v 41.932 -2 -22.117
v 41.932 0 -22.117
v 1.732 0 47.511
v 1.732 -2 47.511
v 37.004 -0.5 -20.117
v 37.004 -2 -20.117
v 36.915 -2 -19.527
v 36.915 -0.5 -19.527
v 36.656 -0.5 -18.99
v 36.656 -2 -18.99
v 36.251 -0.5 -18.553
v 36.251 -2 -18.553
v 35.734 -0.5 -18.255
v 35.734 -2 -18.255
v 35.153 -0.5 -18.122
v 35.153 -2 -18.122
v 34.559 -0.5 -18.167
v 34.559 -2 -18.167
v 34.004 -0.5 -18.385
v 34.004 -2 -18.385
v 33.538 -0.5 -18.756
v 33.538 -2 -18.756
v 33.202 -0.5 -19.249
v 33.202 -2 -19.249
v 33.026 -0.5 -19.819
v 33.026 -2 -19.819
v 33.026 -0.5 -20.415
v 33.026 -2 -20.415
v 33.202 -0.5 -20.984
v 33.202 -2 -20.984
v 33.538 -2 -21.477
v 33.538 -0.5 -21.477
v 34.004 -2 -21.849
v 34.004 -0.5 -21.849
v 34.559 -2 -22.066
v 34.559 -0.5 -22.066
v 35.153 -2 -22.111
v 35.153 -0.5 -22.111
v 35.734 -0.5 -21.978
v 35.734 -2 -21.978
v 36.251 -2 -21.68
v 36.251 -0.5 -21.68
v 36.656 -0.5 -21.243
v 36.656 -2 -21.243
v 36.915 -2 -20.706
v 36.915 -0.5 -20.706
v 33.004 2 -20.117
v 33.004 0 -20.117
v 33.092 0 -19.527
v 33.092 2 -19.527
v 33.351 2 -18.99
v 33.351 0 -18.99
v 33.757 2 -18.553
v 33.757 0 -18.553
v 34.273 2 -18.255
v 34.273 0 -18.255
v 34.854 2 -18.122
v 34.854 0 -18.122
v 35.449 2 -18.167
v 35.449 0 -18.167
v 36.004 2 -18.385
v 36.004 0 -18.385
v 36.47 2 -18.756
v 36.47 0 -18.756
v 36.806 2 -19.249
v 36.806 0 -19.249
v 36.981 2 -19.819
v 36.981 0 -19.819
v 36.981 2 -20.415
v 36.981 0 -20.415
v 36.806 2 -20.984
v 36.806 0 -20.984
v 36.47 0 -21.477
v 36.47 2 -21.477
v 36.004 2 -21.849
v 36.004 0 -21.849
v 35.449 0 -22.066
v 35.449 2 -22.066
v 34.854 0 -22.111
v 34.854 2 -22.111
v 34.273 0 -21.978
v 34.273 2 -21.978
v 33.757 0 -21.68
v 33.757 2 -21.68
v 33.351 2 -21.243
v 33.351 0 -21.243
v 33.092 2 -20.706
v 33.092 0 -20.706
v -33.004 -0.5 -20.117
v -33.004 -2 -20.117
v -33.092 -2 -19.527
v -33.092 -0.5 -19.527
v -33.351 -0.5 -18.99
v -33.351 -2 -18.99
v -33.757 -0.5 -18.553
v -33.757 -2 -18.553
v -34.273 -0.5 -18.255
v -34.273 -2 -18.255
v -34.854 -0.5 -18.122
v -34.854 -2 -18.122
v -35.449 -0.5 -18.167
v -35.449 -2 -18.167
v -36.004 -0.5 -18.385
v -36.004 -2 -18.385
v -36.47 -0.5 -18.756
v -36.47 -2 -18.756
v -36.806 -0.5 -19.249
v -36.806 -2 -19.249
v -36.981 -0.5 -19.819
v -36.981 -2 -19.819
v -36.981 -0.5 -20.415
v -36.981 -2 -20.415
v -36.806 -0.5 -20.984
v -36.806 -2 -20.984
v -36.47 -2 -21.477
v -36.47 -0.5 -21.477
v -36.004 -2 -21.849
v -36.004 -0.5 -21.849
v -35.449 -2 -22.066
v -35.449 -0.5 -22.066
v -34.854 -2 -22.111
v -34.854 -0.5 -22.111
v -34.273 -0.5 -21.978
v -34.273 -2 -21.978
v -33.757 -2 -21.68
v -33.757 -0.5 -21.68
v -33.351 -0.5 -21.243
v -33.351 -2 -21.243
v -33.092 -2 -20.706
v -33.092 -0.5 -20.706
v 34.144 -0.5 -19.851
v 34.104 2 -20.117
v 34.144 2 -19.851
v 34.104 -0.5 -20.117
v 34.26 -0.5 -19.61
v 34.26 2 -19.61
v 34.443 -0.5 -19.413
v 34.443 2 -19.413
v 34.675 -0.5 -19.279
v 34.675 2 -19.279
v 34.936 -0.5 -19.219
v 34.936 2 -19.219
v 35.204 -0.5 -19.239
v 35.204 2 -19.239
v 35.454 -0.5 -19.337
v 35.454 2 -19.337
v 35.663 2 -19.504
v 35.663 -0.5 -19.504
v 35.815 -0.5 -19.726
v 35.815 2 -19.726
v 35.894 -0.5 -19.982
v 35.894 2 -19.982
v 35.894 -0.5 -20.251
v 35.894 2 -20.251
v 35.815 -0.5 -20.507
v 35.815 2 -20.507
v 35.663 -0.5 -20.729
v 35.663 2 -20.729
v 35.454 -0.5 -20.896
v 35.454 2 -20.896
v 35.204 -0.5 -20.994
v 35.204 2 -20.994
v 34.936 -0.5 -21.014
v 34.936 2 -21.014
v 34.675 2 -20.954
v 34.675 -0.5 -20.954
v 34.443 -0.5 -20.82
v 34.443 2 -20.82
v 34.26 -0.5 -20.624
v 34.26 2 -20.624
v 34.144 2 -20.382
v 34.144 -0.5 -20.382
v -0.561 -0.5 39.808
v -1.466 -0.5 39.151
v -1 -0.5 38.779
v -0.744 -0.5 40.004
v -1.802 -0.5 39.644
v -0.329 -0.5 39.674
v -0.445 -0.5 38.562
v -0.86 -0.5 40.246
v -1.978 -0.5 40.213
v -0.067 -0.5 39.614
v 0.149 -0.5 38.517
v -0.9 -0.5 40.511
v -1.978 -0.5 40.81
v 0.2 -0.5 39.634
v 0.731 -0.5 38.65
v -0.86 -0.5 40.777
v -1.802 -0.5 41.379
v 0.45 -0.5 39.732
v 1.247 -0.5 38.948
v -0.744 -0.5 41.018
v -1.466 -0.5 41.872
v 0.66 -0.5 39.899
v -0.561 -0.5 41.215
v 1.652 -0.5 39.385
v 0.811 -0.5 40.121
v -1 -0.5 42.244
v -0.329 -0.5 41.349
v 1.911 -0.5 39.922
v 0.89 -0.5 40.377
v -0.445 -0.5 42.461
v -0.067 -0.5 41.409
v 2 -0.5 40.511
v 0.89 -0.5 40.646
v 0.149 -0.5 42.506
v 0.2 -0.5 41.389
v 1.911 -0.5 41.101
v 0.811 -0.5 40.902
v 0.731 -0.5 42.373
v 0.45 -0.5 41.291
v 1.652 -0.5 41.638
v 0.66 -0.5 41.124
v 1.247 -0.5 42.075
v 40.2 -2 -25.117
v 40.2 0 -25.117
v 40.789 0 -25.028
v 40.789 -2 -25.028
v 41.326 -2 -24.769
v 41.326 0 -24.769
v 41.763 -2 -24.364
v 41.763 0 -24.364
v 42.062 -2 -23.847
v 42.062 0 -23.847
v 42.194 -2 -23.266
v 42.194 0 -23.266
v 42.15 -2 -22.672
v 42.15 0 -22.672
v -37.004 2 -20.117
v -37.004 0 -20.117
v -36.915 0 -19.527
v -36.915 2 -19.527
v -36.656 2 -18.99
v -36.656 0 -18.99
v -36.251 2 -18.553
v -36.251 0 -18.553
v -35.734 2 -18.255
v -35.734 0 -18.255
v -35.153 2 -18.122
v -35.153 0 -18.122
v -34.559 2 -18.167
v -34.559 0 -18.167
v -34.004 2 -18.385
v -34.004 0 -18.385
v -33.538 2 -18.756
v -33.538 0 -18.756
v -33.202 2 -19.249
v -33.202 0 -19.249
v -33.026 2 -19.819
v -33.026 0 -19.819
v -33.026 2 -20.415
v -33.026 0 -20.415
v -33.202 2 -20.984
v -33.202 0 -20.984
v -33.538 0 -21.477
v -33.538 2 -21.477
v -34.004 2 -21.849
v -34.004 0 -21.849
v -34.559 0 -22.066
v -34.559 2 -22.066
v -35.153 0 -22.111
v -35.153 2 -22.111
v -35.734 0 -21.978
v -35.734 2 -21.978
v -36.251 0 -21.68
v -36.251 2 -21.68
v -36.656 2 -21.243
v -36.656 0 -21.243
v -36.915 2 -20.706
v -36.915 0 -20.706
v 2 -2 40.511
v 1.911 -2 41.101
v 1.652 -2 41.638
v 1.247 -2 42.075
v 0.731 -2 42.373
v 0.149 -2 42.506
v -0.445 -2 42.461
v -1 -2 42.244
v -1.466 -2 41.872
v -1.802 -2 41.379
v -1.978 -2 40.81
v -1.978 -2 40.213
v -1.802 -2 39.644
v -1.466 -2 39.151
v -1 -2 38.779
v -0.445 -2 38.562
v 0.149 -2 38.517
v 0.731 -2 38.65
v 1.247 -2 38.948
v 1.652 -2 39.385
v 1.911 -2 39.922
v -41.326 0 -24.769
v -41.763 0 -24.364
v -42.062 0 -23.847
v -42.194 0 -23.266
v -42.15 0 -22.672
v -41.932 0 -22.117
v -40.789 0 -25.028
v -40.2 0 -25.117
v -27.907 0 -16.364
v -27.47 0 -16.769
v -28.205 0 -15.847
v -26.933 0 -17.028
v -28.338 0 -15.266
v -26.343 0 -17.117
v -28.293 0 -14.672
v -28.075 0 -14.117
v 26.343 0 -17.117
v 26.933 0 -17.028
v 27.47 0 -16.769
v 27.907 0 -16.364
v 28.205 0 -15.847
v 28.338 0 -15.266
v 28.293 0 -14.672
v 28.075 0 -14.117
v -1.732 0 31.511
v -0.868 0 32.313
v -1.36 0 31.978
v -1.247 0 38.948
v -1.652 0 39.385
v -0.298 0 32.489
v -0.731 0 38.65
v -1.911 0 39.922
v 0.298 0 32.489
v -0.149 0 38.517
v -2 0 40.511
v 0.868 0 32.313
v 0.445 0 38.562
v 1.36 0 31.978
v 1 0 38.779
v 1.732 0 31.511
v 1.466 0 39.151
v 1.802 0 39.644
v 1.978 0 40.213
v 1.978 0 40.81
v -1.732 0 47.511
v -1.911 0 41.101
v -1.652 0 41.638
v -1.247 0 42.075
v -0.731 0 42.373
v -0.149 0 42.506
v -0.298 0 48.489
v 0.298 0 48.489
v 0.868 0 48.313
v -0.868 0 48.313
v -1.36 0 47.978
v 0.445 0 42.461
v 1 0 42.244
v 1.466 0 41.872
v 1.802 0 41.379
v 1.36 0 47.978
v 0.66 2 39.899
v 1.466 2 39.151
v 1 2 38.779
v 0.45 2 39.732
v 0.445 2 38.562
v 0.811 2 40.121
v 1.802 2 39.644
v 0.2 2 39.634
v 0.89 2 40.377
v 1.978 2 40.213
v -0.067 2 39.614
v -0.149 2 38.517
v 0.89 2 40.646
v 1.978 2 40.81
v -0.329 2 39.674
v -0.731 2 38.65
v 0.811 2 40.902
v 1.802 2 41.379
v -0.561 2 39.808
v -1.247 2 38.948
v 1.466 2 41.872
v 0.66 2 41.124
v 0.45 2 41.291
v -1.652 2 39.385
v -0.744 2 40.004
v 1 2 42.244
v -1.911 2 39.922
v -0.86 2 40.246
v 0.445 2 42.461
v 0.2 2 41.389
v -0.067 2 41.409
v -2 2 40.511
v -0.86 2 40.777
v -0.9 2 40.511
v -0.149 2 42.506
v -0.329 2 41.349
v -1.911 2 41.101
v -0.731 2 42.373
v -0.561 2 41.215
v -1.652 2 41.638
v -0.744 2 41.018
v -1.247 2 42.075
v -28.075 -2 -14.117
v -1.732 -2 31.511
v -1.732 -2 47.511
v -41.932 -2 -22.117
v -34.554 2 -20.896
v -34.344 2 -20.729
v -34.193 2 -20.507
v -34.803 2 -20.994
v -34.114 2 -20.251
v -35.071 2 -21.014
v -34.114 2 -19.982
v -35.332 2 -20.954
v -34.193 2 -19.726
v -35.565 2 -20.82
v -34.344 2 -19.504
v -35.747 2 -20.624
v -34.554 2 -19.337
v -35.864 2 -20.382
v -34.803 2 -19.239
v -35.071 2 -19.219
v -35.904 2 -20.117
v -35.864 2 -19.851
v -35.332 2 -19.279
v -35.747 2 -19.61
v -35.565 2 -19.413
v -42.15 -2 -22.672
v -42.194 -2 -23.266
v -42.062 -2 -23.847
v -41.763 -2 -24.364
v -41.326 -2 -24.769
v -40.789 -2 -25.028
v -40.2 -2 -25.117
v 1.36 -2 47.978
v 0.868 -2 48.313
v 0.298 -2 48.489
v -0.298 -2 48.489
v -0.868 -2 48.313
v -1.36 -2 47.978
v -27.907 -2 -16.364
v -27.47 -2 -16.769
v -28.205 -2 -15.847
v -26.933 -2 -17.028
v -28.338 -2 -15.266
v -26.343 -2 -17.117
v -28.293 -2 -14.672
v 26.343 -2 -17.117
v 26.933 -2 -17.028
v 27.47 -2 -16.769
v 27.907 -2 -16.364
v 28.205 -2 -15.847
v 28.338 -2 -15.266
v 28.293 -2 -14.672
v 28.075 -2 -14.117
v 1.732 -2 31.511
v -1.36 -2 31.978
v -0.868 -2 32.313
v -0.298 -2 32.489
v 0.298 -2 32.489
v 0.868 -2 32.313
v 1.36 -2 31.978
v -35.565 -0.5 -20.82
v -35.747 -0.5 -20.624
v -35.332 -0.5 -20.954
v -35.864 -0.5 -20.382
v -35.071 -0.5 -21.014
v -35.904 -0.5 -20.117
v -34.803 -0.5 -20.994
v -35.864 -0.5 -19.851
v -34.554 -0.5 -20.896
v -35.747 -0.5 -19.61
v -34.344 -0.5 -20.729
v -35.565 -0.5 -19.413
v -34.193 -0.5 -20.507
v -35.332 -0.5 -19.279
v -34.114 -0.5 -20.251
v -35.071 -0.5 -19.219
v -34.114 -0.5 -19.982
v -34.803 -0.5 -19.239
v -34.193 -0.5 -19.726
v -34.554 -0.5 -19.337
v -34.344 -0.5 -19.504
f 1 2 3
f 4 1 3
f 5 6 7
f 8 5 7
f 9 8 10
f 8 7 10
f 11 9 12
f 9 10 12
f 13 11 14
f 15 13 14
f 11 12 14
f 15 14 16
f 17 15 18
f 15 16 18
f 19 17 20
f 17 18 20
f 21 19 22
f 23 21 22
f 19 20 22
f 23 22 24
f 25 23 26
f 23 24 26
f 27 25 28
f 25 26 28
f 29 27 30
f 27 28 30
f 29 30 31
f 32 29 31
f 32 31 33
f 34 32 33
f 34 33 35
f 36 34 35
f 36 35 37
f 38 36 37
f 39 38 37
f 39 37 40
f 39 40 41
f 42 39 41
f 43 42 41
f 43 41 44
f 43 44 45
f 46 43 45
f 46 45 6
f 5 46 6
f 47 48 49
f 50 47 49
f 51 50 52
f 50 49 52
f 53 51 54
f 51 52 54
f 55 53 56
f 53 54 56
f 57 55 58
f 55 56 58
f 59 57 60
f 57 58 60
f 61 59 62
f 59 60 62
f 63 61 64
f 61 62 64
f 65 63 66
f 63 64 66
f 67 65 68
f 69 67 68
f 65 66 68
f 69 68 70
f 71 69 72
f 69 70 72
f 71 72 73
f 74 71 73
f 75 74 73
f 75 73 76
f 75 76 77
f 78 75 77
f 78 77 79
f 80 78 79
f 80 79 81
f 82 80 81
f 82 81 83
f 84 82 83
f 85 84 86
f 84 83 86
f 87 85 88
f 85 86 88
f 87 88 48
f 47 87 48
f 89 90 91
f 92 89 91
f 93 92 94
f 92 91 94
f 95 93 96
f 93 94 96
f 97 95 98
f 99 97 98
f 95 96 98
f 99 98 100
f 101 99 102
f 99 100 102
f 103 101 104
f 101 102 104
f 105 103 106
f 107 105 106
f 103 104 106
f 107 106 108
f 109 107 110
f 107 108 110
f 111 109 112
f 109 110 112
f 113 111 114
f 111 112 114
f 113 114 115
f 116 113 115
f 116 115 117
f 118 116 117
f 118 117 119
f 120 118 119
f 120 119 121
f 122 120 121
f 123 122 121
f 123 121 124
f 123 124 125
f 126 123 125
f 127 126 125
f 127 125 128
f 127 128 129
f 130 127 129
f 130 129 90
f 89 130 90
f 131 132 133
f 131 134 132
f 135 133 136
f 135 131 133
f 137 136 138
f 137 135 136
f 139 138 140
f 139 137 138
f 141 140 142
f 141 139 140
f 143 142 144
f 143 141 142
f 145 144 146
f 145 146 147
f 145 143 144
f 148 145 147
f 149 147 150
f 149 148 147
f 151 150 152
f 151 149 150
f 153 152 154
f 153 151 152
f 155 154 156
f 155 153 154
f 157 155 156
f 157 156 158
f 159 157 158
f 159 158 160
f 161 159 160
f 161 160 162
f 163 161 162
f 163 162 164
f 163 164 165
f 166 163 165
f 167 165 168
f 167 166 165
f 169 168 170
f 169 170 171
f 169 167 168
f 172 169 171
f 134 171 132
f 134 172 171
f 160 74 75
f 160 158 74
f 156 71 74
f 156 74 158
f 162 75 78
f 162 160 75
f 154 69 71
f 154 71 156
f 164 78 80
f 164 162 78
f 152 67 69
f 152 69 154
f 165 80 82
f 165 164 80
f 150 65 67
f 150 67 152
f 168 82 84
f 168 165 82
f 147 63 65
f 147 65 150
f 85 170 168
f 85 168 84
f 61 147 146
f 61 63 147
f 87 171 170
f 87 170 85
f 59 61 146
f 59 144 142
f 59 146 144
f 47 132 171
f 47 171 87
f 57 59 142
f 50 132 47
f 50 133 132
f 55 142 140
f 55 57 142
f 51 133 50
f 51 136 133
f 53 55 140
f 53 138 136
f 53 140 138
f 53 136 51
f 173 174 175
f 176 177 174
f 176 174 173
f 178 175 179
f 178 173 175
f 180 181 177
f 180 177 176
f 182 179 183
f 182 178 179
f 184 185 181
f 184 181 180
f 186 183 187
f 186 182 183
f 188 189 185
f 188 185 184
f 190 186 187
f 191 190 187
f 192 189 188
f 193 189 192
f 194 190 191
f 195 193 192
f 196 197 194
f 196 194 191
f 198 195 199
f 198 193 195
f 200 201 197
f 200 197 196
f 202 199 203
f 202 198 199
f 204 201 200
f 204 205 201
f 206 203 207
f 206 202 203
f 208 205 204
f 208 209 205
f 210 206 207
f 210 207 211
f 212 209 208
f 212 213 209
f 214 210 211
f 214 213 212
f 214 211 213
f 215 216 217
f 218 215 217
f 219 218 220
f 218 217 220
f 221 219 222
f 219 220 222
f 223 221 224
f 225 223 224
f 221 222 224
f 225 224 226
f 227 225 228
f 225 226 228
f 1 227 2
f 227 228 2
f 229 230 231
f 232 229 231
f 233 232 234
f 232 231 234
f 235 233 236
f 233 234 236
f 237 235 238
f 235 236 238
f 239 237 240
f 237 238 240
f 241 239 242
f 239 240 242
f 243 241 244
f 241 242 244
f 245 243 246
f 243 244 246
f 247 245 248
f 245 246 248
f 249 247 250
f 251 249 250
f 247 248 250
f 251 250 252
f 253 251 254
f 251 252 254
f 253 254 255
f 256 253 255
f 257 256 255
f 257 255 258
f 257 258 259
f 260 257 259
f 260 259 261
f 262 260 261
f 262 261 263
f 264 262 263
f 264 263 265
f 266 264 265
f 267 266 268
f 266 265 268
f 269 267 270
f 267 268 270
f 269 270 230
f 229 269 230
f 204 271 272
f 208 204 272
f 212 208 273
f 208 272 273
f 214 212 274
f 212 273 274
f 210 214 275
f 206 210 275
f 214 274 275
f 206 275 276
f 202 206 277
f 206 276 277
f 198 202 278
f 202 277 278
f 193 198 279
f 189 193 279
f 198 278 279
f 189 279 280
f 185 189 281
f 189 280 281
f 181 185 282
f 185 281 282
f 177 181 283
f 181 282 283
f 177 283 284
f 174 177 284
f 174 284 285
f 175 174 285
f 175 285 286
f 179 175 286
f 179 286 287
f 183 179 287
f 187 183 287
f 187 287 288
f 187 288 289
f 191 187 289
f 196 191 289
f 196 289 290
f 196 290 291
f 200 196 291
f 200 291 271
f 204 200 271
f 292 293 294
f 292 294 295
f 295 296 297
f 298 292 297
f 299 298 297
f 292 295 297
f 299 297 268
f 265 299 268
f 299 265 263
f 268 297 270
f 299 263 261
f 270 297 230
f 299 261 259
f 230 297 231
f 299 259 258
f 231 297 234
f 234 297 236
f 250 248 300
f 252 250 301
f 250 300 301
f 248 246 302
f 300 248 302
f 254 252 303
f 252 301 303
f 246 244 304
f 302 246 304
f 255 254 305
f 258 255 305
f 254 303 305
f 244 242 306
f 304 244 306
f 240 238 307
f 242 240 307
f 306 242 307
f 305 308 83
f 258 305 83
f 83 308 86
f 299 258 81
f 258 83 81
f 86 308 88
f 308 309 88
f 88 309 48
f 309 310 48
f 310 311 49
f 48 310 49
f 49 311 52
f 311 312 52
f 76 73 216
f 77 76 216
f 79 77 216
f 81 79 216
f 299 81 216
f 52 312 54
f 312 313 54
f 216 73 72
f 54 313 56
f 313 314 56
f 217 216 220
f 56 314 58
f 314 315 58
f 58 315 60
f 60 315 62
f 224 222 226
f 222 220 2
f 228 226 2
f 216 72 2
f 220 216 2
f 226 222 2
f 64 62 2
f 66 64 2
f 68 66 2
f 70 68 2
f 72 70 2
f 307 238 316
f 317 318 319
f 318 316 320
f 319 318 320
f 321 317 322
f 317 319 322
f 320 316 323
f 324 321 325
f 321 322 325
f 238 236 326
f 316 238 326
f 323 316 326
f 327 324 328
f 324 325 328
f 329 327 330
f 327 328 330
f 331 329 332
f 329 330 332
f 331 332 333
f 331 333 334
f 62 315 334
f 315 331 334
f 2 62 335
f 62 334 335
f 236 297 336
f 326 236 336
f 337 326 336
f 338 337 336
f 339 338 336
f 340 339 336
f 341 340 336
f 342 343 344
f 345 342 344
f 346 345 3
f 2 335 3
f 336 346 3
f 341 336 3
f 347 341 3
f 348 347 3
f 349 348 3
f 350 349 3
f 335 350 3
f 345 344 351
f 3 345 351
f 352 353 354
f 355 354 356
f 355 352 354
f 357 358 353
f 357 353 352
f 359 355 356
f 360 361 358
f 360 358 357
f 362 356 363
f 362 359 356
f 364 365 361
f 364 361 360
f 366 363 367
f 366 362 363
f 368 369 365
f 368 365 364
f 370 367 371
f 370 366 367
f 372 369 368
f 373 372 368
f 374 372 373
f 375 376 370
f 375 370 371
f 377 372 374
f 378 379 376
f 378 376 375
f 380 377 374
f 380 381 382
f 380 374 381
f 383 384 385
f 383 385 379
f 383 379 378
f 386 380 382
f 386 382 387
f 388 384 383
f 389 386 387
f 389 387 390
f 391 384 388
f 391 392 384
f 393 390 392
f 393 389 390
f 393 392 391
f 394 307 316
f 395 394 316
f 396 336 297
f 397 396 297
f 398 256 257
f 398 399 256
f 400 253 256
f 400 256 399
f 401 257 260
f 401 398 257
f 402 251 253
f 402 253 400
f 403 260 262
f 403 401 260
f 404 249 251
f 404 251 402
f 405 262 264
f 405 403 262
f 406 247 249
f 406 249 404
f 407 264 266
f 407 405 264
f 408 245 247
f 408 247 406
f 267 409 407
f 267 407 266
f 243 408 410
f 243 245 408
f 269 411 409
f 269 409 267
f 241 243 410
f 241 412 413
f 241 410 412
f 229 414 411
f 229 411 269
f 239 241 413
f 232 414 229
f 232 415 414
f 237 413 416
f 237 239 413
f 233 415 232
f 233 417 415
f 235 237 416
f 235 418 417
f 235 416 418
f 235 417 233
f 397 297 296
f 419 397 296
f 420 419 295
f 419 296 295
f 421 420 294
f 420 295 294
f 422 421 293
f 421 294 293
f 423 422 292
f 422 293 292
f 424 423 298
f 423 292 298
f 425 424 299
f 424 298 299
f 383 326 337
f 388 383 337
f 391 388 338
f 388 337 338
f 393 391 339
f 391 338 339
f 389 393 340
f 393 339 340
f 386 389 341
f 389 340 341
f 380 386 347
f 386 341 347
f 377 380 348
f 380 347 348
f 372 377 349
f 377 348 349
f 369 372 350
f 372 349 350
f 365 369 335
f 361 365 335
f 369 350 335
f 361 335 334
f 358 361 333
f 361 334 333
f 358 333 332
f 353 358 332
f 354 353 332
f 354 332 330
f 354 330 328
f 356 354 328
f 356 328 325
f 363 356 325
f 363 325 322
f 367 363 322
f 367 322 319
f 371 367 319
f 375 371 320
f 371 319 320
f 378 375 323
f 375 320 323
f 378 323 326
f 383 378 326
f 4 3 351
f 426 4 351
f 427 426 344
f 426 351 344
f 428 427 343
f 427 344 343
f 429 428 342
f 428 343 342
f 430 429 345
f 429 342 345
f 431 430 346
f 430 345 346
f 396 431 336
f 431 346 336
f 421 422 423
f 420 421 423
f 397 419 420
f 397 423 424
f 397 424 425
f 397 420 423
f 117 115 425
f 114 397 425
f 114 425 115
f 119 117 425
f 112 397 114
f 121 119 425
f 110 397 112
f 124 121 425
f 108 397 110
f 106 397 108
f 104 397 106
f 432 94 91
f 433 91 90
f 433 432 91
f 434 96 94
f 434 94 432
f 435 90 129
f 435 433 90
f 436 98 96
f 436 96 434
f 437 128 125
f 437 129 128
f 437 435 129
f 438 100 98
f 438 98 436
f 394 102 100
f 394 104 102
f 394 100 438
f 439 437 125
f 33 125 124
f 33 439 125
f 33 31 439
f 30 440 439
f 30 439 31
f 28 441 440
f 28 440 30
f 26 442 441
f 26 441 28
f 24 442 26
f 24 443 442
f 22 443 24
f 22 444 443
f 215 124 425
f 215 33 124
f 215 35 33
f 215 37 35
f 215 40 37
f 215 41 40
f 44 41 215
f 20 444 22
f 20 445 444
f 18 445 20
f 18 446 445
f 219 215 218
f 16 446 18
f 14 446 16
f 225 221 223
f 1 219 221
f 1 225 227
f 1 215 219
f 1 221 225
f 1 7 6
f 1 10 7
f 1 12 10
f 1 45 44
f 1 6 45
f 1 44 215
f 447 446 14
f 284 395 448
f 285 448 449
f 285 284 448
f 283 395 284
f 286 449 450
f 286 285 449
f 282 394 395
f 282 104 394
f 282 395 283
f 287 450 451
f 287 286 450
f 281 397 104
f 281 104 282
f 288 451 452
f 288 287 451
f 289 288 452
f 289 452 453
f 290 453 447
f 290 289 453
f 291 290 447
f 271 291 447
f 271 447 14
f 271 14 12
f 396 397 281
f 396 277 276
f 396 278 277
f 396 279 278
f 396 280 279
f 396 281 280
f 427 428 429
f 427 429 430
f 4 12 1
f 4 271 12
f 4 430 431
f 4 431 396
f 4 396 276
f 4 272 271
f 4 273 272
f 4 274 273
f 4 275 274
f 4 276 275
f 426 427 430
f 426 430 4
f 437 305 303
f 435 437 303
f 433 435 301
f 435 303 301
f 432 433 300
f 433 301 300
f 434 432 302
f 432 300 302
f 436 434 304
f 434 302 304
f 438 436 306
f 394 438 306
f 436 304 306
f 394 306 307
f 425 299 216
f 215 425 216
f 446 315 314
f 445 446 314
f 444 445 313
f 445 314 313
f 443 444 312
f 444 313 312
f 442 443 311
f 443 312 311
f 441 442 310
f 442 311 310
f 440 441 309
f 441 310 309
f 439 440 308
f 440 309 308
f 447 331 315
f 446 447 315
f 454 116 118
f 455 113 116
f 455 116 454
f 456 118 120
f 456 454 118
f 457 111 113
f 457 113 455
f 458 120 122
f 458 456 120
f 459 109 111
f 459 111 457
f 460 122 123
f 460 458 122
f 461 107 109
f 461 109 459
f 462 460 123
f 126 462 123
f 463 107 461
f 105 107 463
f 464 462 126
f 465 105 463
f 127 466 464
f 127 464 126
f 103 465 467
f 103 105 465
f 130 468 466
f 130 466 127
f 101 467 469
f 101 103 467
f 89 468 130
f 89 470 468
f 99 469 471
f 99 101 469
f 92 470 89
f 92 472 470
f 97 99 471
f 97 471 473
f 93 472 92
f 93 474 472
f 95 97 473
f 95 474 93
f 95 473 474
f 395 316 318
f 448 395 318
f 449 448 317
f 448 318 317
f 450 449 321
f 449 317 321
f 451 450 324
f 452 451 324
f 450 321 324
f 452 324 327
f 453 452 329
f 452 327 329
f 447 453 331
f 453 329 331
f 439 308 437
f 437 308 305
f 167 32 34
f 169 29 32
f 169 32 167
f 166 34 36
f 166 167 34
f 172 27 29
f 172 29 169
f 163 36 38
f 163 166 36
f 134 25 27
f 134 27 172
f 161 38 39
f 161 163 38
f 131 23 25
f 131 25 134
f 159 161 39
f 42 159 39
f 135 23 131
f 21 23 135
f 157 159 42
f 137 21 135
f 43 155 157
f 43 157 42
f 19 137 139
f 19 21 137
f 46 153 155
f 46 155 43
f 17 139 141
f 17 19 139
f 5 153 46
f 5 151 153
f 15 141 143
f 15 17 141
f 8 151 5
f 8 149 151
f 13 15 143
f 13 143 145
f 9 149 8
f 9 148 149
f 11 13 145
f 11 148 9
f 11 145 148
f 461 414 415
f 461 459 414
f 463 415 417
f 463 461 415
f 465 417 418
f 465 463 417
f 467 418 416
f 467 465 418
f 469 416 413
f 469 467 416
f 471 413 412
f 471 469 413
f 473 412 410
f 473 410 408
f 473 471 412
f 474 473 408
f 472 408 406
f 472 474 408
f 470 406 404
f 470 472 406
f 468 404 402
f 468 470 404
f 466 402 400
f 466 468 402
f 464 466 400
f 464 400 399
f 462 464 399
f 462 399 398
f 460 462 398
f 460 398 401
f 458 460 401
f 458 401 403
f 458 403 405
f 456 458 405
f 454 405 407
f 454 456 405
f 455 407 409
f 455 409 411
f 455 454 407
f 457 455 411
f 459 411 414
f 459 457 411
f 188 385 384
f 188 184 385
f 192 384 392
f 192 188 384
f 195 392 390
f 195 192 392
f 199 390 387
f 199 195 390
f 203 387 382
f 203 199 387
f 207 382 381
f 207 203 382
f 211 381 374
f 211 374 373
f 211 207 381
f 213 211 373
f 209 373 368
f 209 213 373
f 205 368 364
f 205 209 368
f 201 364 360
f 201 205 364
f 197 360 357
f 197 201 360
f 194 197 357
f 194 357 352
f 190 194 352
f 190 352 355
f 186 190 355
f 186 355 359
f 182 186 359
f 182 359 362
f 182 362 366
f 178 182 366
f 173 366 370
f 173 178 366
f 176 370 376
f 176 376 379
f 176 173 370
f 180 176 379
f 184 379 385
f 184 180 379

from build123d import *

# Parameters (mm, degrees)
F1_DEPTH       = 2
F2_R           = 2
F2_R_2         = 0.9
F3_DEPTH       = 2
F5_D           = 1.8
F5_CBORE_D     = 4
F5_CBORE_DEPTH = 1.5


# Not quite as in the source:
# - after a boolean that leaves OpenCascade's solid faulty, fix() repairs it


with BuildPart() as f1:
    # F0 (on Front) → F1 (new body)
    with BuildSketch(Plane.XZ):
        with BuildLine():
            ThreePointArc((1.7320509844, 47.5114831651), (1.769e-07, 48.5114831651), (-1.7320506307, 47.5114831651))
            Line((-1.7320506307, 47.5114831651), (-41.9318474004, -22.1166072941))
            ThreePointArc((-41.9318474004, -22.1166072941), (-41.9318474004, -24.1166072941), (-40.1997965929, -25.1166072941))
            Line((-40.1997965929, -25.1166072941), (40.1997969466, -25.1166072941))
            ThreePointArc((40.1997969466, -25.1166072941), (41.9318477542, -24.1166072941), (41.9318477542, -22.1166072941))
            Line((41.9318477542, -22.1166072941), (1.7320509844, 47.5114831651))
        make_face()
        with BuildLine():
            ThreePointArc((-1.7320506307, 31.5114831651), (1.769e-07, 32.5114831651), (1.7320509844, 31.5114831651))
            Line((1.7320509844, 31.5114831651), (28.0754412936, -14.1166072941))
            ThreePointArc((28.0754412936, -14.1166072941), (28.0754412936, -16.1166072941), (26.343390486, -17.1166072941))
            Line((26.343390486, -17.1166072941), (-26.3433901323, -17.1166072941))
            ThreePointArc((-26.3433901323, -17.1166072941), (-28.0754409399, -16.1166072941), (-28.0754409399, -14.1166072941))
            Line((-28.0754409399, -14.1166072941), (-1.7320506307, 31.5114831651))
        make_face(mode=Mode.SUBTRACT)
    extrude(amount=F1_DEPTH)

    # F2 (on face) → F3 (join)
    with BuildSketch(Plane(origin=(0, 0, 0), x_dir=(-1, 0, 0), z_dir=(0, 1, 0))):
        with Locations((-1.769e-07, 40.5114831651)):
            Circle(F2_R)
        with Locations((-1.769e-07, 40.5114831651)):
            Circle(F2_R_2, mode=Mode.SUBTRACT)
        with Locations((-35.0036445239, -20.1166072941)):
            Circle(F2_R)
        with Locations((-35.0036445239, -20.1166072941)):
            Circle(F2_R_2, mode=Mode.SUBTRACT)
        with Locations((35.0036441701, -20.1166072941)):
            Circle(F2_R)
        with Locations((35.0036441701, -20.1166072941)):
            Circle(F2_R_2, mode=Mode.SUBTRACT)
    extrude(amount=F3_DEPTH)

    # F5 (through all)
    with Locations(Plane.XZ.offset(2)):
        with Locations((1.769e-07, 40.5114831651), (-35.0036441701, -20.1166072941), (35.0036445239, -20.1166072941)):
            CounterBoreHole(F5_D / 2, F5_CBORE_D / 2, F5_CBORE_DEPTH)

    add(f1.part.fix(), mode=Mode.REPLACE)


solid = f1.part
